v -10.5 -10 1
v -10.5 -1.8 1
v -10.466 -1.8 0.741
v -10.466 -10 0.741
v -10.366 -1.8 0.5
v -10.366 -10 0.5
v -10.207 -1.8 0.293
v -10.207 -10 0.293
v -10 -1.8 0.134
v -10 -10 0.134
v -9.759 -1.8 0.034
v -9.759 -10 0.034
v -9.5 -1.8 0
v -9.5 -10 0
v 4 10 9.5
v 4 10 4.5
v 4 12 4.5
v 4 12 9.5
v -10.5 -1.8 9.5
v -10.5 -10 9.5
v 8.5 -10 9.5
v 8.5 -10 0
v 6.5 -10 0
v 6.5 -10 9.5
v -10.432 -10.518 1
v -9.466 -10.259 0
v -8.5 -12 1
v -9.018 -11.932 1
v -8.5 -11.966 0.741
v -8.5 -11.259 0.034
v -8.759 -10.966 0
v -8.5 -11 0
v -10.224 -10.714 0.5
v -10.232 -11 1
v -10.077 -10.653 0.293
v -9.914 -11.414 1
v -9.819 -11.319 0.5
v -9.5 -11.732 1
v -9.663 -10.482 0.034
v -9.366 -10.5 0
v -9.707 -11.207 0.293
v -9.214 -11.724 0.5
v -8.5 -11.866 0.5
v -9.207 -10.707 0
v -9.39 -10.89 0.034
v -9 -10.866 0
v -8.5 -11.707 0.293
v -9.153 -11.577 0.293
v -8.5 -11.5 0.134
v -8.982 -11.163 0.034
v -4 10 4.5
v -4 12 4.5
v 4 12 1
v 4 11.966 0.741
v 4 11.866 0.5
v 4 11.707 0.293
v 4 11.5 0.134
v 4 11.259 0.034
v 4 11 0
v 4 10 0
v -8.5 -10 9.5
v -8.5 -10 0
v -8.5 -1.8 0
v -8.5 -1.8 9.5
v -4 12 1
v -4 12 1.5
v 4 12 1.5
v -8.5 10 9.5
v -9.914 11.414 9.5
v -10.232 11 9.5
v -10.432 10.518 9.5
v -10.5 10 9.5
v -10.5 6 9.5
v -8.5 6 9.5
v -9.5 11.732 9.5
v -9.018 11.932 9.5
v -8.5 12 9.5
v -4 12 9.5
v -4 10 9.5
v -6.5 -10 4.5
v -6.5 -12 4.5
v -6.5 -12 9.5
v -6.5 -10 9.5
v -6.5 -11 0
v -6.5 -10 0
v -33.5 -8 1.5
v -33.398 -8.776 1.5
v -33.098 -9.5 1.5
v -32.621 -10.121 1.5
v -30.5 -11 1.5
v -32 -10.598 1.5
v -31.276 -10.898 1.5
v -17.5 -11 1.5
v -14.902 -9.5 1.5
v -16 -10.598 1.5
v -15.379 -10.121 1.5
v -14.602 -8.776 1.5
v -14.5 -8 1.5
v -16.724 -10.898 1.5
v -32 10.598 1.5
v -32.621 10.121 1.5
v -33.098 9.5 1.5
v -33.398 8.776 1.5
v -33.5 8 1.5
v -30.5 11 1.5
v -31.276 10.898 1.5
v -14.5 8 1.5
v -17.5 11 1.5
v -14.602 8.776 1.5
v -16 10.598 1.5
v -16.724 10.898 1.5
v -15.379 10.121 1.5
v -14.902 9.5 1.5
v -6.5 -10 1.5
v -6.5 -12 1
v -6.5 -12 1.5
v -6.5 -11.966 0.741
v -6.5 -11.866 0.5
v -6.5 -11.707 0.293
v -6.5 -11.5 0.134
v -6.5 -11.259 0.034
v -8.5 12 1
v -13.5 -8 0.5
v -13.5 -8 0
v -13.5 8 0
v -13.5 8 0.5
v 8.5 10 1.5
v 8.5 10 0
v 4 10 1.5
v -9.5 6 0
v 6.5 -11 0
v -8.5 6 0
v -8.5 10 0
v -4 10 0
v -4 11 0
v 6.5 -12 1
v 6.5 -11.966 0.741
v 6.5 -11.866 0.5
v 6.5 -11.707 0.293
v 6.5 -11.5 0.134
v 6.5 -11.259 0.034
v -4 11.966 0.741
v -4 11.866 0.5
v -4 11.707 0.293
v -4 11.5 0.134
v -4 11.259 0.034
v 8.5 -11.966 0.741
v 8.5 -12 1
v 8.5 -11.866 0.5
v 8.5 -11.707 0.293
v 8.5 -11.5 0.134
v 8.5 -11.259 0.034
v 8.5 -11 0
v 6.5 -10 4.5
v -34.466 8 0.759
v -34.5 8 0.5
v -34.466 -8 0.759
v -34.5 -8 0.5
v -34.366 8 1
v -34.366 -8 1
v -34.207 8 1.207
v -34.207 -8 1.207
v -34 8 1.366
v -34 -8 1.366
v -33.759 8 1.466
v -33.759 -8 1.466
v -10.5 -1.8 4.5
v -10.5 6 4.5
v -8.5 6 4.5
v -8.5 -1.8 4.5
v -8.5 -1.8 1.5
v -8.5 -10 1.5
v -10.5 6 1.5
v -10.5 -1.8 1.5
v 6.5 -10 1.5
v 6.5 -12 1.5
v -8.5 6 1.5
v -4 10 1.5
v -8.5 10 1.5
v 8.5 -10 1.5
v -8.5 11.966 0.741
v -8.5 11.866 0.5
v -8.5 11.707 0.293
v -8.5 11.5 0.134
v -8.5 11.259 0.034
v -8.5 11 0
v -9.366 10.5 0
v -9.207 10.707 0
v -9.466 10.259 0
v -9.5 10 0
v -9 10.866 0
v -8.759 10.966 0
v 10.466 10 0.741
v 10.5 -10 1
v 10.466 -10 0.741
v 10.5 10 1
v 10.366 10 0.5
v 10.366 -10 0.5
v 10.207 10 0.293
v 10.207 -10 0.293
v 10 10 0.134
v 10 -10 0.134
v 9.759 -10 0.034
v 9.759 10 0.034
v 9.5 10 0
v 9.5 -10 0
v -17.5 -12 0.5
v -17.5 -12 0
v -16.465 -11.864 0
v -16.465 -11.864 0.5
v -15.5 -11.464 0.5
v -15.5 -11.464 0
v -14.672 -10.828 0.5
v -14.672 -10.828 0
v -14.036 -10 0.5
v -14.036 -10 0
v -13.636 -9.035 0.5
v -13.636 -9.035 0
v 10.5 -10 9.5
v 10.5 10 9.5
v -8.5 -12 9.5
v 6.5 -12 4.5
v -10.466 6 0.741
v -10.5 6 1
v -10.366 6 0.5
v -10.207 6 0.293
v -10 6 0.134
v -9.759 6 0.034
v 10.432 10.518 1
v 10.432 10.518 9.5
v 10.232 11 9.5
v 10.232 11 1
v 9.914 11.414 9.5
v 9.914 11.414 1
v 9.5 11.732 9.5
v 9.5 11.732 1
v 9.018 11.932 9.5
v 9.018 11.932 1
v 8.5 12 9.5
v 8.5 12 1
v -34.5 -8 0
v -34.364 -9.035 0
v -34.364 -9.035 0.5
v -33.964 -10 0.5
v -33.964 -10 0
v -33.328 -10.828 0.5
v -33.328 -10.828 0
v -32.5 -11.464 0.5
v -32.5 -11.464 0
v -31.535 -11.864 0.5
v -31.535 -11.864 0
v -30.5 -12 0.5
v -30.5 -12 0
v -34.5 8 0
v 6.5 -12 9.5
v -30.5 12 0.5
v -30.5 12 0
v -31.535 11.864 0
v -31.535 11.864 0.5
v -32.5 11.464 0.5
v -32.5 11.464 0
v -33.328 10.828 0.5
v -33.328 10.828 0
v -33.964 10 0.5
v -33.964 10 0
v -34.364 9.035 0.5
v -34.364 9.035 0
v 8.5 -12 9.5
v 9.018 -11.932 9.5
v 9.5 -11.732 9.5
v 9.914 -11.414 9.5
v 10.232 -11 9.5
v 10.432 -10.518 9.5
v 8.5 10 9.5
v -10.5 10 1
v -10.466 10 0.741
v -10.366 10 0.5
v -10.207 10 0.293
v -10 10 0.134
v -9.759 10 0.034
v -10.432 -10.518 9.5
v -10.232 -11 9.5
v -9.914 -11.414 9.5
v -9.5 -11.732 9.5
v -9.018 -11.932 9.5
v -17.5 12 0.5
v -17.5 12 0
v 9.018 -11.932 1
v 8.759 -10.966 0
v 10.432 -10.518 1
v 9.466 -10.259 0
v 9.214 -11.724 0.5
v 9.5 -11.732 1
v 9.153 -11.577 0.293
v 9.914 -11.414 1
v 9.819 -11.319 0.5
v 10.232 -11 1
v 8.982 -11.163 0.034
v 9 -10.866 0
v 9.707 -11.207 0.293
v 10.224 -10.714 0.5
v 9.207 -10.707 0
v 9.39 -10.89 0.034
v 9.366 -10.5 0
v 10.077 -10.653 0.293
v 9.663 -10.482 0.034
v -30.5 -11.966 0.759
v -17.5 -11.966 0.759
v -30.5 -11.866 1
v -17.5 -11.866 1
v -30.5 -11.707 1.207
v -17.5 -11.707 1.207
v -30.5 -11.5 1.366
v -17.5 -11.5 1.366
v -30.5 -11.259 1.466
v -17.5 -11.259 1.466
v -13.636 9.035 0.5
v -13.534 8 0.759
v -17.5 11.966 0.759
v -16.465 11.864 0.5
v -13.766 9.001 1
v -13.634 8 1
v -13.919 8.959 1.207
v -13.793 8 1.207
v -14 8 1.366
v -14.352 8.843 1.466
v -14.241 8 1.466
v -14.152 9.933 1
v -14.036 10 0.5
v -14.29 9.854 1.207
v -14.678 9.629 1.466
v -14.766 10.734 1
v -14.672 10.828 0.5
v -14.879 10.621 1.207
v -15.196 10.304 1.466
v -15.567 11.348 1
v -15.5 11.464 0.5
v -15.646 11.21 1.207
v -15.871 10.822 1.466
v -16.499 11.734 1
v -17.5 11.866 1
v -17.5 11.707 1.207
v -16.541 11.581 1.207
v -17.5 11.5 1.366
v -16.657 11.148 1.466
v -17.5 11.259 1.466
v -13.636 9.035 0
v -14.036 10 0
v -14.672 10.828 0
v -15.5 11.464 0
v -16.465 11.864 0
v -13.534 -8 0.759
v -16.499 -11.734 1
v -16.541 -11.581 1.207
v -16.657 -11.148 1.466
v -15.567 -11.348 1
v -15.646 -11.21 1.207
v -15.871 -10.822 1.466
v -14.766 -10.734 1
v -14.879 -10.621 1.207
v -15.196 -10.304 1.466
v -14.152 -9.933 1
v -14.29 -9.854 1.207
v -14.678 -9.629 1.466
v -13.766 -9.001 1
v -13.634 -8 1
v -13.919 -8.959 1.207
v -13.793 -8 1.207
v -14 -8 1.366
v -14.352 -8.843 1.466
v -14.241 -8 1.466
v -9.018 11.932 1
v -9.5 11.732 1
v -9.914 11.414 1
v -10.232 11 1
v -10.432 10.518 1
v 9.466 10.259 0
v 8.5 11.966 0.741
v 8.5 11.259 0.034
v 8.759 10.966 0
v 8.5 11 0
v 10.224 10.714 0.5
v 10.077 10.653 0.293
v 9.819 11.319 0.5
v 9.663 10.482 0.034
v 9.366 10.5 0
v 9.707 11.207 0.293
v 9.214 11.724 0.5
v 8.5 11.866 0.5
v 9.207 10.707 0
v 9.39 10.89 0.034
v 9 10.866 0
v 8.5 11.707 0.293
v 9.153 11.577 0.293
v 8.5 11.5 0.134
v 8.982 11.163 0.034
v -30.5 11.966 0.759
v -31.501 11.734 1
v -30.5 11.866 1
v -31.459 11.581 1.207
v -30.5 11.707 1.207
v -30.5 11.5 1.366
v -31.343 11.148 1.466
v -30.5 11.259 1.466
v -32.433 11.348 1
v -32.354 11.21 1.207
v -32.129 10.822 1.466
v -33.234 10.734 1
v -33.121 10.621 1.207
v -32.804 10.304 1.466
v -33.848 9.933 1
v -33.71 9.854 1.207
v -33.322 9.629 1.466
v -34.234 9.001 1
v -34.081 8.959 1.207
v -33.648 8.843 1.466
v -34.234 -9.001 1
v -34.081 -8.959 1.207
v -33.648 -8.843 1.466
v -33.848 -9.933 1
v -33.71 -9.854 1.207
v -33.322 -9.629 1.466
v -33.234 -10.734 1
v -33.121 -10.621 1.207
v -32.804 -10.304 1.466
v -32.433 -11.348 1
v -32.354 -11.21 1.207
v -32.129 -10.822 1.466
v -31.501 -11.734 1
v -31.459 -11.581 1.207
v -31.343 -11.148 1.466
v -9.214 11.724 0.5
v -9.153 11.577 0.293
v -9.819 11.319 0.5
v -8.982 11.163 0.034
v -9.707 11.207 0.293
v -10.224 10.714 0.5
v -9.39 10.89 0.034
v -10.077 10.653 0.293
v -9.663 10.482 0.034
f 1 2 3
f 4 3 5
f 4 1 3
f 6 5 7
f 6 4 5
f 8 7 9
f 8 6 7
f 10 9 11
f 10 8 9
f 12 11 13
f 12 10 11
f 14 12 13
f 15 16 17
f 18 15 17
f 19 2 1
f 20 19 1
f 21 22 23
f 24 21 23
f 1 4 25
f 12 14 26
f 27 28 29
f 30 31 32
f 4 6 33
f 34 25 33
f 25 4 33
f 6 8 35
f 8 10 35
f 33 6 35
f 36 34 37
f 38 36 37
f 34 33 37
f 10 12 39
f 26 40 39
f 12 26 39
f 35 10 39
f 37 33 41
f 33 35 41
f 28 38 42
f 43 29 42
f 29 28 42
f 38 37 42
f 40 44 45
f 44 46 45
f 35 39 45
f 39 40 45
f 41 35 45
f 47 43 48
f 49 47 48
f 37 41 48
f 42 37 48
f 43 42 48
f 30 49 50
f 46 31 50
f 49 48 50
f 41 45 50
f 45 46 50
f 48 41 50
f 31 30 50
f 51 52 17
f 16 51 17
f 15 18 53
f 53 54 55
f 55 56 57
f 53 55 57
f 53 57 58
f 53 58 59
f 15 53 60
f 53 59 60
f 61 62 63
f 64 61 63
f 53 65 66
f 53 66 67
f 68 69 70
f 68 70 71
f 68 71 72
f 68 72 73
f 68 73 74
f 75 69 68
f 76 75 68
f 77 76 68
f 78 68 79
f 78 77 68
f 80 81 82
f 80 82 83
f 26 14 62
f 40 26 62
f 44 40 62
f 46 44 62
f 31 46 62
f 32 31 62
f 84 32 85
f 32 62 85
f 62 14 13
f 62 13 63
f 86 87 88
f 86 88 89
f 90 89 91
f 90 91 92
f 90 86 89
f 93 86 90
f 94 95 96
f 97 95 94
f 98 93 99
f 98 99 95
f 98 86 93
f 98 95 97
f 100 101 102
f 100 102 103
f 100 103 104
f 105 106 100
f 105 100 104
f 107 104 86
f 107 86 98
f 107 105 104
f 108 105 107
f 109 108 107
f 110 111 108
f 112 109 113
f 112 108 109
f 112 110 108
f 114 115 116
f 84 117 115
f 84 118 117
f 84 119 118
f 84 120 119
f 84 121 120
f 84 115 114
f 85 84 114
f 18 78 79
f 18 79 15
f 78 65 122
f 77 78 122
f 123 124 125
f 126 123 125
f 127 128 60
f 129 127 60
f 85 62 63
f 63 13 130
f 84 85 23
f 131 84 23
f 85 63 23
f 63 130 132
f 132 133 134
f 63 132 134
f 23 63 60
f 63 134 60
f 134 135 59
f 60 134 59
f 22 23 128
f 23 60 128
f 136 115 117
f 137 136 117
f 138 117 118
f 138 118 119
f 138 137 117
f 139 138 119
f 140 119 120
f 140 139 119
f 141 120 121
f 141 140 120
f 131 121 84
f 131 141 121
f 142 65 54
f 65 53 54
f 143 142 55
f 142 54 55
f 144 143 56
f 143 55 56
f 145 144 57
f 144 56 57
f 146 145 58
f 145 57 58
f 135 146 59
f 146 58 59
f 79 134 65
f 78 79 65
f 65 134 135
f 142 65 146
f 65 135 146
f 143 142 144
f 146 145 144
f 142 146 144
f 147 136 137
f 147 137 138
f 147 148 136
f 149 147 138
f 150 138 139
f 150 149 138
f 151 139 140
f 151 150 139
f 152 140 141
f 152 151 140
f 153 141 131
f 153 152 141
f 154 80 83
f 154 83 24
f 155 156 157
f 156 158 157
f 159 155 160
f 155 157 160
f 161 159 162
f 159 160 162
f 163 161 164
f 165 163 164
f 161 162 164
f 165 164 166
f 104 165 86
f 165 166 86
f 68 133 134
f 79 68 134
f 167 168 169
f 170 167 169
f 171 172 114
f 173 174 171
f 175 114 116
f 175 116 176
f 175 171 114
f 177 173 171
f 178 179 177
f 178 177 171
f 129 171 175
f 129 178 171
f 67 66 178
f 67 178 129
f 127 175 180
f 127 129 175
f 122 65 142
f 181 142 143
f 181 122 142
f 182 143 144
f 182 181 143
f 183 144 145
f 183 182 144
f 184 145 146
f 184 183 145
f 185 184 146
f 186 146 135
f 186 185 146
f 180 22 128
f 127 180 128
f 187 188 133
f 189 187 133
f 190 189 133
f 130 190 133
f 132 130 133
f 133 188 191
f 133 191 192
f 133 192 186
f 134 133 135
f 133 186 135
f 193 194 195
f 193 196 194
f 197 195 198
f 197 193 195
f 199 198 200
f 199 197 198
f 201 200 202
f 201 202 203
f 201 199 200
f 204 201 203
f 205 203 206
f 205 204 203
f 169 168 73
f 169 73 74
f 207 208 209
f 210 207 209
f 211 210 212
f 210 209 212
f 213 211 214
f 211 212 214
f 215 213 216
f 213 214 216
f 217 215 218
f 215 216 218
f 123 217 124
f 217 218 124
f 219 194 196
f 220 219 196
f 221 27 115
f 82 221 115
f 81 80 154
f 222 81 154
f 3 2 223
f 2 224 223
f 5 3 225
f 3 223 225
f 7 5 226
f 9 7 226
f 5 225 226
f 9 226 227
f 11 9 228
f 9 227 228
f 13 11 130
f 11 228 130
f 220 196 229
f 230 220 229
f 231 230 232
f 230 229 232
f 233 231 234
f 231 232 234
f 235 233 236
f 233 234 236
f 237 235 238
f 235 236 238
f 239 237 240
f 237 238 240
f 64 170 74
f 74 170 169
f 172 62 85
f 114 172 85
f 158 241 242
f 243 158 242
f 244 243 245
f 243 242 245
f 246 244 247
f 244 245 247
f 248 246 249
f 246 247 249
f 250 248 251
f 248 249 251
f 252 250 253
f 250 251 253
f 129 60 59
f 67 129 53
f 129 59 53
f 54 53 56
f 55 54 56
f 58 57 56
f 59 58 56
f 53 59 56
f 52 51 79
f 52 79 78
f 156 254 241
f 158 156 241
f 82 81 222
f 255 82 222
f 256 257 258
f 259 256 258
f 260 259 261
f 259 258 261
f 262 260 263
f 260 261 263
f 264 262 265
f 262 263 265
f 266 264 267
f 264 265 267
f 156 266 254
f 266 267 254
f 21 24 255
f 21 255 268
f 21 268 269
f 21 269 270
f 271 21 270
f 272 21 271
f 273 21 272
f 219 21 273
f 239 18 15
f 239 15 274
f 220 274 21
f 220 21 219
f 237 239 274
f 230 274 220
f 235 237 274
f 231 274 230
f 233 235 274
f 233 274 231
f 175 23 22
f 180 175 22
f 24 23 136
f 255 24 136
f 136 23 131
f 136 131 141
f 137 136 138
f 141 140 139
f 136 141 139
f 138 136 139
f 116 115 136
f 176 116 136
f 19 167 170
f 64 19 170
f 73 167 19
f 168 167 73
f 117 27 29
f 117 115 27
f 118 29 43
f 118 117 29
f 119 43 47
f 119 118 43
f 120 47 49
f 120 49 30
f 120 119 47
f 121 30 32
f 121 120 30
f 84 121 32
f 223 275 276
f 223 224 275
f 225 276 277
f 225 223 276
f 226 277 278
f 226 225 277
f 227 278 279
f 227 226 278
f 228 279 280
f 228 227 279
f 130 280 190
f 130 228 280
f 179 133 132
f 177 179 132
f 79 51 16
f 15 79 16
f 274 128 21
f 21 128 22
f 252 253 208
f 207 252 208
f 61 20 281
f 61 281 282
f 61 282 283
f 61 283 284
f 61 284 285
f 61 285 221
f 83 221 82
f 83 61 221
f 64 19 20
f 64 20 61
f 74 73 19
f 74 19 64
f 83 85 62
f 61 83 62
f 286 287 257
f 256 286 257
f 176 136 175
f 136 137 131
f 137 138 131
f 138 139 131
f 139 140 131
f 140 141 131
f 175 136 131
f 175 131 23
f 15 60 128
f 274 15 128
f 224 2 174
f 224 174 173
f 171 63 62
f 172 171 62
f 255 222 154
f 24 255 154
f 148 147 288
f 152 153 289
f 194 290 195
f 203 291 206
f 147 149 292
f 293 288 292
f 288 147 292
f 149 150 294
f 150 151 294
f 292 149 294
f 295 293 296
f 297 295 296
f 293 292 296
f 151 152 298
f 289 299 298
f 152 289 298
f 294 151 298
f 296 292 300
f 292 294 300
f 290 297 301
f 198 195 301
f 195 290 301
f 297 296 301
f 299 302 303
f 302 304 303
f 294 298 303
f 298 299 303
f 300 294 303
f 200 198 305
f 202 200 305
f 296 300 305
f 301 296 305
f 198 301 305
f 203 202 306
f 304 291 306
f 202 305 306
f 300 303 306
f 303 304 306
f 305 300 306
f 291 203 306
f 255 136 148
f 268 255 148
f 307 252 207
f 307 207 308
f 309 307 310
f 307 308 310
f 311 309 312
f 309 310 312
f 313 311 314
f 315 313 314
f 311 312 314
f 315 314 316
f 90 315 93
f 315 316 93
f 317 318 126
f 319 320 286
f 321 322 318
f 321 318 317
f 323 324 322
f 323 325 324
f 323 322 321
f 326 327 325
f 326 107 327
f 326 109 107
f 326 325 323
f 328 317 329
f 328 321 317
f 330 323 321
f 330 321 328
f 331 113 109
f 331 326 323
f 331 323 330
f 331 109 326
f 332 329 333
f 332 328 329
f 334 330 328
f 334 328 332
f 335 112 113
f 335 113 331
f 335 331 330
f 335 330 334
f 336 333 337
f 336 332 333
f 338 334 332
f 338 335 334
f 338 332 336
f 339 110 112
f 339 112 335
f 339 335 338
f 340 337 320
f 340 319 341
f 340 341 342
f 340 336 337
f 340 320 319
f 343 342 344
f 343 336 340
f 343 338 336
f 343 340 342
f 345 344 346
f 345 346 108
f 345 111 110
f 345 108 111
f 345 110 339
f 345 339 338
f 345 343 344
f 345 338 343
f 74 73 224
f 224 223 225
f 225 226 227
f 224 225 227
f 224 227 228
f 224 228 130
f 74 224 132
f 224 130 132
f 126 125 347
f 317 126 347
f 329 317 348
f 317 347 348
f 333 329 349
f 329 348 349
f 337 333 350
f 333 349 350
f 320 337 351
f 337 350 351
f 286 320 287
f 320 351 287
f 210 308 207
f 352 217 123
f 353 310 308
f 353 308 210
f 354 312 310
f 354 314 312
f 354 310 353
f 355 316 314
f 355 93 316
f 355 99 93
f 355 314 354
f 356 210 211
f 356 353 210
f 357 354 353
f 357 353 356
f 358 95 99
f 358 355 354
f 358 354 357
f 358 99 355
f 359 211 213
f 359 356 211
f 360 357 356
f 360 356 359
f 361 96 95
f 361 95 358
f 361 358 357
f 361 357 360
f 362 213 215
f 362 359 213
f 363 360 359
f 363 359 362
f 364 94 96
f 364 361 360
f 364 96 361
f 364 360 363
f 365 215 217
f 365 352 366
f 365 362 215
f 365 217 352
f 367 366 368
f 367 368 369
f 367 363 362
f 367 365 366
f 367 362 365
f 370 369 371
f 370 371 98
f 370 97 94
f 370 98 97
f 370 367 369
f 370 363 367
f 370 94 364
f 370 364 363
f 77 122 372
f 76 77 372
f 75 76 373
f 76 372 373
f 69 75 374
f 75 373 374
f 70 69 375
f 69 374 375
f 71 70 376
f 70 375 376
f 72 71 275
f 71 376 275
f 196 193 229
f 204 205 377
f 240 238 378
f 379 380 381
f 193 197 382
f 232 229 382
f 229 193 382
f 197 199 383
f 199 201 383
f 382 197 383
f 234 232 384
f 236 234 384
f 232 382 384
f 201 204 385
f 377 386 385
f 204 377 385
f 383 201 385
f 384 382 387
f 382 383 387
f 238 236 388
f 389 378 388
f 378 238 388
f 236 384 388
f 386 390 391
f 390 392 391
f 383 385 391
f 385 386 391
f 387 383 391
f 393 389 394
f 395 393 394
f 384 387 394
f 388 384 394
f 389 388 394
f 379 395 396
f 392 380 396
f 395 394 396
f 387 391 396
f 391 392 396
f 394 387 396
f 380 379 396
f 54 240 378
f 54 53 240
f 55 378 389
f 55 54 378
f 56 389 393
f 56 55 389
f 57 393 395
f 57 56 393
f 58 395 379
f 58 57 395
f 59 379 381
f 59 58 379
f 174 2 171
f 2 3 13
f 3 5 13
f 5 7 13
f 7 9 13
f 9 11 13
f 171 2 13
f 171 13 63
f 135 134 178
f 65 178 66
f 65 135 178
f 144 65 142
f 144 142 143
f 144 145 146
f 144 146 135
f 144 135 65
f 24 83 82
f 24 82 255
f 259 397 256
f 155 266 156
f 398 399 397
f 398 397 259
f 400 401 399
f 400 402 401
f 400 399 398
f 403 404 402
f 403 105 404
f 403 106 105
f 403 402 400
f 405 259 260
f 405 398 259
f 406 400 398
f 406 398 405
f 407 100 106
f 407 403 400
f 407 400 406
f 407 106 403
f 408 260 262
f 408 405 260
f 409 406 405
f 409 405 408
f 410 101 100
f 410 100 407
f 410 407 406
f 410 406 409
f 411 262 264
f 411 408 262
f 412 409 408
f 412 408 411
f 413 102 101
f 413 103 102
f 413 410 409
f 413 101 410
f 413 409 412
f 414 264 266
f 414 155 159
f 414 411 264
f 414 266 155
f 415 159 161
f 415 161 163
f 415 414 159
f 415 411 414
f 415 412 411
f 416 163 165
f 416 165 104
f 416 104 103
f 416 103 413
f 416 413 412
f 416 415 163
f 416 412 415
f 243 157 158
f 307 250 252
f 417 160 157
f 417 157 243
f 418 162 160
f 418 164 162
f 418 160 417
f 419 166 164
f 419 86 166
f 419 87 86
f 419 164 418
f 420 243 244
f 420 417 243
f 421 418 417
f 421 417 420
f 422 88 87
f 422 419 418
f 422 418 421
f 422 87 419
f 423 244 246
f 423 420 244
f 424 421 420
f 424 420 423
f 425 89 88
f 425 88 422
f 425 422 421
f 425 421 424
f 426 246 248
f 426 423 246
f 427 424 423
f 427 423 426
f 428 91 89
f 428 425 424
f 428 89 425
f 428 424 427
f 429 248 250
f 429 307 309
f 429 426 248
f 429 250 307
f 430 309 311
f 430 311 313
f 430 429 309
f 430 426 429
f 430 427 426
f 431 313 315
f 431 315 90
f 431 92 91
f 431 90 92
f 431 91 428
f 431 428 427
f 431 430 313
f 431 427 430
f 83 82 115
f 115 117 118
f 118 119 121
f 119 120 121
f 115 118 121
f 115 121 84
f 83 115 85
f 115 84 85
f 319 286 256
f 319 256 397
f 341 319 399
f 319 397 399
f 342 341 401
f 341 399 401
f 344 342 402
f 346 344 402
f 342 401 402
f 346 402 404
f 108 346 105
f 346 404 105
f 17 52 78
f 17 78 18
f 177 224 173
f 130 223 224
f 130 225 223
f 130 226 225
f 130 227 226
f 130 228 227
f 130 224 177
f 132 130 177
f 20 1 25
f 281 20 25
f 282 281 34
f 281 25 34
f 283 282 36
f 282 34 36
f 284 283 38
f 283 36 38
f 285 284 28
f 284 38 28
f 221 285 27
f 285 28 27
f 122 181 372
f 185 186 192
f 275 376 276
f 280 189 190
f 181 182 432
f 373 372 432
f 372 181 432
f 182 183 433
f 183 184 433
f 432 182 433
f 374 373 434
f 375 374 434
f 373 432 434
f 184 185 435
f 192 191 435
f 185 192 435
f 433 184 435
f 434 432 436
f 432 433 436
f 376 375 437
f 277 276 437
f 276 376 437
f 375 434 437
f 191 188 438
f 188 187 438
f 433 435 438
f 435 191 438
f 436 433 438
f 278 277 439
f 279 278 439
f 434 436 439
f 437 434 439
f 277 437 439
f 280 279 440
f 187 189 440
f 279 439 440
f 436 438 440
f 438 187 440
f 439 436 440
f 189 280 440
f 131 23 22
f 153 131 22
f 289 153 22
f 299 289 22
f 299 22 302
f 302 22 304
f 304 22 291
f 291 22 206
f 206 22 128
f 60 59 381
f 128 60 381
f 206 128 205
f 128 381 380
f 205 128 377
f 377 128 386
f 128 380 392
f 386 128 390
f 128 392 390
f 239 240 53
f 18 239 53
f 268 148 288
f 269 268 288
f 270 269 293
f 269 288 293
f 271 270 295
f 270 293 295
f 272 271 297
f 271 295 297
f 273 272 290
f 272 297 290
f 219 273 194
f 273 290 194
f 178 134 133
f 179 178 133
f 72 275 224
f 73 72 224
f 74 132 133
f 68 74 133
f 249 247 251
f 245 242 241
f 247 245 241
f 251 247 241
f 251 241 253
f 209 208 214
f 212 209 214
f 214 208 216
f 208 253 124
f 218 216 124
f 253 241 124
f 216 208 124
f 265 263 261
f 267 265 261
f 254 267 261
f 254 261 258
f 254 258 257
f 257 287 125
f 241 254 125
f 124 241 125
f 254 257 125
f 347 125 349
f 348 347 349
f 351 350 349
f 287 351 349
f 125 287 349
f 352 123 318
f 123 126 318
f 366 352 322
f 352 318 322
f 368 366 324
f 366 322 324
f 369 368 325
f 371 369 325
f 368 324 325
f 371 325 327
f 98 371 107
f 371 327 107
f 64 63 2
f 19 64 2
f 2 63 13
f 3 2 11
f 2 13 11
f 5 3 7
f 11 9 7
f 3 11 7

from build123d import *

# Parameters (mm, degrees)
F1_DEPTH = 9.5
F2_W     = 8
F2_H     = 2
F2_W_2   = 2
F2_H_2   = 7.8
F2_W_3   = 13
F3_DEPTH = 1.5
F5_START = 4.5
F4_W     = 8
F4_H     = 2
F5_DEPTH = 5
F4_W_2   = 2
F4_H_2   = 7.8
F4_W_3   = 13
F6_R     = 1
F6_2_R   = 1
F6_3_R   = 1
F6_4_R   = 1
F8_DEPTH = 1.5
F9_R     = 1


with BuildPart() as f1:
    # F0 (on Top) → F1 (new body)
    with BuildSketch(Plane.XY):
        with BuildLine():
            Line((8.5, 10), (8.5, -10))
            Line((8.5, -10), (6.5, -10))
            Line((6.5, -10), (6.5, -12))
            Line((6.5, -12), (8.5, -12))
            ThreePointArc((8.5, -12), (9.9142135624, -11.4142135624), (10.5, -10))
            Line((10.5, -10), (10.5, 10))
            ThreePointArc((10.5, 10), (9.9142135624, 11.4142135624), (8.5, 12))
            Line((8.5, 12), (4, 12))
            Line((4, 12), (4, 10))
            Line((4, 10), (8.5, 10))
        make_face()
    extrude(amount=F1_DEPTH)

    # F6
    f6_edges = [f1.edges().sort_by_distance(p)[0] for p in [
        (9.914214, 11.414214, 0),
    ]]
    fillet(f6_edges, radius=F6_R)


with BuildPart() as f1b:
    # F0 (on Top) → F1, piece 2 (new body)
    with BuildSketch(Plane.XY):
        with BuildLine():
            Line((-6.5, -12), (-6.5, -10))
            Line((-6.5, -10), (-8.5, -10))
            Line((-8.5, -10), (-8.5, -1.8))
            Line((-8.5, -1.8), (-10.5, -1.8))
            Line((-10.5, -1.8), (-10.5, -10))
            ThreePointArc((-10.5, -10), (-9.9142135624, -11.4142135624), (-8.5, -12))
            Line((-8.5, -12), (-6.5, -12))
        make_face()
    extrude(amount=F1_DEPTH)

    # F6#4
    f6_4_edges = [f1b.edges().sort_by_distance(p)[0] for p in [
        (-10.5, -5.9, 0),
    ]]
    fillet(f6_4_edges, radius=F6_4_R)


with BuildPart() as f1c:
    # F0 (on Top) → F1, piece 3 (new body)
    with BuildSketch(Plane.XY):
        with BuildLine():
            Line((-8.5, 10), (-4, 10))
            Line((-4, 10), (-4, 12))
            Line((-4, 12), (-8.5, 12))
            ThreePointArc((-8.5, 12), (-9.9142135624, 11.4142135624), (-10.5, 10))
            Line((-10.5, 10), (-10.5, 6))
            Line((-10.5, 6), (-8.5, 6))
            Line((-8.5, 6), (-8.5, 10))
        make_face()
    extrude(amount=F1_DEPTH)

    # F6#3
    f6_3_edges = [f1c.edges().sort_by_distance(p)[0] for p in [
        (-9.914214, 11.414214, 0),
    ]]
    fillet(f6_3_edges, radius=F6_3_R)


with BuildPart() as f3:
    # F2 (on Top) → F3 (new body)
    with BuildSketch(Plane.XY):
        Polygon((6.5, -10), (8.5, -10), (8.5, 10), (4, 10), (-4, 10), (-8.5, 10), (-8.5, 6), (-8.5, -1.8), (-8.5, -10), (-6.5, -10), align=None)
        with Locations((0, 11)):
            Rectangle(F2_W, F2_H)
        with Locations((-9.5, 2.1)):
            Rectangle(F2_W_2, F2_H_2)
        with Locations((0, -11)):
            Rectangle(F2_W_3, F2_H)
    extrude(amount=F3_DEPTH)

    # F6#2
    f6_2_edges = [f3.edges().sort_by_distance(p)[0] for p in [
        (0, 12, 0),
        (-10.5, 2.1, 0),
        (0, -12, 0),
    ]]
    fillet(f6_2_edges, radius=F6_2_R)


with BuildPart() as f5:
    # F4 (on Top) → F5 (new body)
    with BuildSketch(Plane.XY.offset(F5_START)):
        with Locations((0, 11)):
            Rectangle(F4_W, F4_H)
    extrude(amount=F5_DEPTH)


with BuildPart() as f5b:
    # F4 (on Top) → F5, piece 2 (new body)
    with BuildSketch(Plane.XY.offset(F5_START)):
        with Locations((-9.5, 2.1)):
            Rectangle(F4_W_2, F4_H_2)
    extrude(amount=F5_DEPTH)


with BuildPart() as f5c:
    # F4 (on Top) → F5, piece 3 (new body)
    with BuildSketch(Plane.XY.offset(F5_START)):
        with Locations((0, -11)):
            Rectangle(F4_W_3, F4_H)
    extrude(amount=F5_DEPTH)


with BuildPart() as f8:
    # F7 (on Top) → F8 (new body)
    with BuildSketch(Plane.XY):
        with BuildLine():
            Line((-13.5, -8), (-13.5, 8))
            ThreePointArc((-13.5, 8), (-14.6715728753, 10.8284271247), (-17.5, 12))
            Line((-17.5, 12), (-30.5, 12))
            ThreePointArc((-30.5, 12), (-33.3284271247, 10.8284271247), (-34.5, 8))
            Line((-34.5, 8), (-34.5, -8))
            ThreePointArc((-34.5, -8), (-33.3284271247, -10.8284271247), (-30.5, -12))
            Line((-30.5, -12), (-17.5, -12))
            ThreePointArc((-17.5, -12), (-14.6715728753, -10.8284271247), (-13.5, -8))
        make_face()
        with BuildLine():
            ThreePointArc((-15.5, -8), (-16.0857864376, -9.4142135624), (-17.5, -10))
            Line((-17.5, -10), (-30.5, -10))
            ThreePointArc((-30.5, -10), (-31.9142135624, -9.4142135624), (-32.5, -8))
            Line((-32.5, -8), (-32.5, 8))
            ThreePointArc((-32.5, 8), (-31.9142135624, 9.4142135624), (-30.5, 10))
            Line((-30.5, 10), (-17.5, 10))
            ThreePointArc((-17.5, 10), (-16.0857864376, 9.4142135624), (-15.5, 8))
            Line((-15.5, 8), (-15.5, -8))
        make_face(mode=Mode.SUBTRACT)
        with BuildLine():
            Line((-30.5, -10), (-17.5, -10))
            ThreePointArc((-17.5, -10), (-16.0857864376, -9.4142135624), (-15.5, -8))
            Line((-15.5, -8), (-15.5, 8))
            ThreePointArc((-15.5, 8), (-16.0857864376, 9.4142135624), (-17.5, 10))
            Line((-17.5, 10), (-30.5, 10))
            ThreePointArc((-30.5, 10), (-31.9142135624, 9.4142135624), (-32.5, 8))
            Line((-32.5, 8), (-32.5, -8))
            ThreePointArc((-32.5, -8), (-31.9142135624, -9.4142135624), (-30.5, -10))
        make_face()
    extrude(amount=F8_DEPTH)

    # F9
    f9_edges = [f8.edges().sort_by_distance(p)[0] for p in [
        (-24, -12, 1.5),
        (-14.671573, -10.828427, 1.5),
        (-13.5, 0, 1.5),
        (-14.671573, 10.828427, 1.5),
        (-24, 12, 1.5),
        (-33.328427, 10.828427, 1.5),
        (-34.5, 0, 1.5),
        (-33.328427, -10.828427, 1.5),
    ]]
    fillet(f9_edges, radius=F9_R)


solid = Compound([f1.part, f1b.part, f1c.part, f3.part, f5.part, f5b.part, f5c.part, f8.part])
